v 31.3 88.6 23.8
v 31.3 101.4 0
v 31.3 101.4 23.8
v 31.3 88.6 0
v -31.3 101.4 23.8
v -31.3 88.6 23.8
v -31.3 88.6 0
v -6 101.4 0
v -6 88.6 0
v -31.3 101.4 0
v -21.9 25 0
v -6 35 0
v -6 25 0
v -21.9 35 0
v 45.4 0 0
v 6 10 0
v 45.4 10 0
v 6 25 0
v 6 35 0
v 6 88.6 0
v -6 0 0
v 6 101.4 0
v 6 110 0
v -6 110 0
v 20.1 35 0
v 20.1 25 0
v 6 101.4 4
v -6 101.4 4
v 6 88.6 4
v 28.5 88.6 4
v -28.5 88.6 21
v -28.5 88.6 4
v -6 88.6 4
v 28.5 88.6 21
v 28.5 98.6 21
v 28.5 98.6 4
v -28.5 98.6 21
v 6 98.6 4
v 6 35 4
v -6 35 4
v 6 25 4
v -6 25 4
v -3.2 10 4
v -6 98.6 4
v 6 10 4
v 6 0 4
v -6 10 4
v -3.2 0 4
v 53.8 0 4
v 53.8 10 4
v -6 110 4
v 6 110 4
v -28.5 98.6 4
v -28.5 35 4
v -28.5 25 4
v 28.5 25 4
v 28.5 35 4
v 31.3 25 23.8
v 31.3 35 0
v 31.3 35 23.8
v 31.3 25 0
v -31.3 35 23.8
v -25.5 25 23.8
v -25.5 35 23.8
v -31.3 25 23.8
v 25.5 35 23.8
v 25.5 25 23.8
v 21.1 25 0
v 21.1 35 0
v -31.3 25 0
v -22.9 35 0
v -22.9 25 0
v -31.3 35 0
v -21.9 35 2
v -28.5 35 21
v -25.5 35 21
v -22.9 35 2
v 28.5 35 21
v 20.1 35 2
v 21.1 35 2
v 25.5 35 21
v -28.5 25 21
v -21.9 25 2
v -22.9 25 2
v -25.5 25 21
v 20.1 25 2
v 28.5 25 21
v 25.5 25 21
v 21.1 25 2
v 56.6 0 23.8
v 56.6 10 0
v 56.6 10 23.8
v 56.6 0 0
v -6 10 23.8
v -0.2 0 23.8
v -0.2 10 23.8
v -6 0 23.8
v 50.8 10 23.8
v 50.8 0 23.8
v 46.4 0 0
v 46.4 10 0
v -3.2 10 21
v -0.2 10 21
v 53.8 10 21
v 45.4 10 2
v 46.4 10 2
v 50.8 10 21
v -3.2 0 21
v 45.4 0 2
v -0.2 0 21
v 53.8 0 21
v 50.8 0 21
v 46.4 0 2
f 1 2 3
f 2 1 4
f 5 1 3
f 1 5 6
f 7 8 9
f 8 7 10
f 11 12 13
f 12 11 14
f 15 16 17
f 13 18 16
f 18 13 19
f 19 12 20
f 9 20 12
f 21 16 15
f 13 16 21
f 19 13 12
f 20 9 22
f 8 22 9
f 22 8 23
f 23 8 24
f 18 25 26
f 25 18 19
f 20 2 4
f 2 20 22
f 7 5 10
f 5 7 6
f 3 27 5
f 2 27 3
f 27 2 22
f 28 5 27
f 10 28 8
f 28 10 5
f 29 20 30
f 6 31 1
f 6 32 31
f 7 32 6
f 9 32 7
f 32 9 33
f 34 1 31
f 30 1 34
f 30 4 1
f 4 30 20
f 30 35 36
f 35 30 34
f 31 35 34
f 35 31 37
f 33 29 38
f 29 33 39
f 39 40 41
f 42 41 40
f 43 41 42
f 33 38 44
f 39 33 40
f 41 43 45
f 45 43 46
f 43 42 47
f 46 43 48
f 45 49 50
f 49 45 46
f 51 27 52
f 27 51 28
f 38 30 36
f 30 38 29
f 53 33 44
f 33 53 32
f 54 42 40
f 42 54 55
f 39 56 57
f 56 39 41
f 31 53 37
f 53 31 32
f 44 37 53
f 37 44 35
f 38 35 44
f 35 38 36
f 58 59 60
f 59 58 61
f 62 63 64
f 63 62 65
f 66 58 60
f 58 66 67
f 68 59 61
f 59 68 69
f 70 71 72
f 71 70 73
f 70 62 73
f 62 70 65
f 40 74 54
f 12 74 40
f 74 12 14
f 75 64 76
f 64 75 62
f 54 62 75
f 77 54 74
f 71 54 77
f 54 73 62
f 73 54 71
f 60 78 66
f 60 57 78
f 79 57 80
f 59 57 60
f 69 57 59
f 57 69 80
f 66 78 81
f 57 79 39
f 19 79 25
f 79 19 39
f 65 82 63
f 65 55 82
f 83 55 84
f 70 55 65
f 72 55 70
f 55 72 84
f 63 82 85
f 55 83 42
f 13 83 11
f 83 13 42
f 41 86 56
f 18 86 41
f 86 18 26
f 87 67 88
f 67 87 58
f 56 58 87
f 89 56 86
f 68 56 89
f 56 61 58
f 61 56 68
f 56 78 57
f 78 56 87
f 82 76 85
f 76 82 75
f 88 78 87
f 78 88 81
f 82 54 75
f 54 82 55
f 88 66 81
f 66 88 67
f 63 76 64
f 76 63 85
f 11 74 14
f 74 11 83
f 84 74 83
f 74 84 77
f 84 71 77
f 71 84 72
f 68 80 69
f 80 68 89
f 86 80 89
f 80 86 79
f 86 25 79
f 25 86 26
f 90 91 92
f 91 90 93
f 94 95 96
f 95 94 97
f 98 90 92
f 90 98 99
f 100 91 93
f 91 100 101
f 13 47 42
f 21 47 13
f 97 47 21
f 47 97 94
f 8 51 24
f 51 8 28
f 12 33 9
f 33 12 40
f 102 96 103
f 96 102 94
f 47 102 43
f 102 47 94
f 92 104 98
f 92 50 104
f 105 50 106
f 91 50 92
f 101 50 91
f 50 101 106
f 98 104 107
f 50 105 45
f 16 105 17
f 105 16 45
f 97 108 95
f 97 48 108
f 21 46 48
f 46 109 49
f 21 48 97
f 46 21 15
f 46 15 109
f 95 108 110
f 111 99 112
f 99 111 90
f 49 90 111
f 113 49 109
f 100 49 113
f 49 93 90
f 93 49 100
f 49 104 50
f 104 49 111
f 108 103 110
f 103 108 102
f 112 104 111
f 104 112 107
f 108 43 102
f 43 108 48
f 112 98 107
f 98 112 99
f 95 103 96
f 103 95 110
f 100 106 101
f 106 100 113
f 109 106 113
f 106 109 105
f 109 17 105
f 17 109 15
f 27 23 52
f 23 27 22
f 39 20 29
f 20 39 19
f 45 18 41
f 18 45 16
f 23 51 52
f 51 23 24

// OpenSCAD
wall=2.8;
$fn=100;

module fixing() {
difference() {
	translate([0,0,-8]) cube([20,4,10]);
	#translate([10,8,-14.5])rotate([90,0,0])cylinder(r=15, h=15);
}
}
difference() {
	union() {
		// base
		translate([-6,0,0]) cube([12,110,4]);

		// back
		translate([-57/2-wall,93-10+2*wall,0]) difference() {
			cube([2*wall+57,10+wall,17+4+wall]);
			translate([wall,-2,4])cube([57,12,17]);
		}

		// middle
		translate([-57/2-wall,25,0]) difference() {
			cube([2*wall+57,10,17+4+wall]);
			translate([wall,-1,4])cube([57,12,17]);
			translate([wall+3,-wall,4+2*wall])cube([57-6,10+2*wall,17]);
			translate([3*wall,0,0]) cube([1,20,2]);
			translate([57-2*wall,0,0]) cube([1,20,2]);
		}
		
		// front
		translate([-6,0,0]) difference() {
			cube([2*wall+57,10,17+4+wall]);
			translate([wall,-1,4])cube([57,12,17]);
			translate([wall+3,-wall,4+2*wall])cube([57-6,10+2*wall,17]);
			translate([3*wall,0,0]) cube([1,20,2]);
			translate([57-2*wall,0,0]) cube([1,20,2]);
		}
	}
}
